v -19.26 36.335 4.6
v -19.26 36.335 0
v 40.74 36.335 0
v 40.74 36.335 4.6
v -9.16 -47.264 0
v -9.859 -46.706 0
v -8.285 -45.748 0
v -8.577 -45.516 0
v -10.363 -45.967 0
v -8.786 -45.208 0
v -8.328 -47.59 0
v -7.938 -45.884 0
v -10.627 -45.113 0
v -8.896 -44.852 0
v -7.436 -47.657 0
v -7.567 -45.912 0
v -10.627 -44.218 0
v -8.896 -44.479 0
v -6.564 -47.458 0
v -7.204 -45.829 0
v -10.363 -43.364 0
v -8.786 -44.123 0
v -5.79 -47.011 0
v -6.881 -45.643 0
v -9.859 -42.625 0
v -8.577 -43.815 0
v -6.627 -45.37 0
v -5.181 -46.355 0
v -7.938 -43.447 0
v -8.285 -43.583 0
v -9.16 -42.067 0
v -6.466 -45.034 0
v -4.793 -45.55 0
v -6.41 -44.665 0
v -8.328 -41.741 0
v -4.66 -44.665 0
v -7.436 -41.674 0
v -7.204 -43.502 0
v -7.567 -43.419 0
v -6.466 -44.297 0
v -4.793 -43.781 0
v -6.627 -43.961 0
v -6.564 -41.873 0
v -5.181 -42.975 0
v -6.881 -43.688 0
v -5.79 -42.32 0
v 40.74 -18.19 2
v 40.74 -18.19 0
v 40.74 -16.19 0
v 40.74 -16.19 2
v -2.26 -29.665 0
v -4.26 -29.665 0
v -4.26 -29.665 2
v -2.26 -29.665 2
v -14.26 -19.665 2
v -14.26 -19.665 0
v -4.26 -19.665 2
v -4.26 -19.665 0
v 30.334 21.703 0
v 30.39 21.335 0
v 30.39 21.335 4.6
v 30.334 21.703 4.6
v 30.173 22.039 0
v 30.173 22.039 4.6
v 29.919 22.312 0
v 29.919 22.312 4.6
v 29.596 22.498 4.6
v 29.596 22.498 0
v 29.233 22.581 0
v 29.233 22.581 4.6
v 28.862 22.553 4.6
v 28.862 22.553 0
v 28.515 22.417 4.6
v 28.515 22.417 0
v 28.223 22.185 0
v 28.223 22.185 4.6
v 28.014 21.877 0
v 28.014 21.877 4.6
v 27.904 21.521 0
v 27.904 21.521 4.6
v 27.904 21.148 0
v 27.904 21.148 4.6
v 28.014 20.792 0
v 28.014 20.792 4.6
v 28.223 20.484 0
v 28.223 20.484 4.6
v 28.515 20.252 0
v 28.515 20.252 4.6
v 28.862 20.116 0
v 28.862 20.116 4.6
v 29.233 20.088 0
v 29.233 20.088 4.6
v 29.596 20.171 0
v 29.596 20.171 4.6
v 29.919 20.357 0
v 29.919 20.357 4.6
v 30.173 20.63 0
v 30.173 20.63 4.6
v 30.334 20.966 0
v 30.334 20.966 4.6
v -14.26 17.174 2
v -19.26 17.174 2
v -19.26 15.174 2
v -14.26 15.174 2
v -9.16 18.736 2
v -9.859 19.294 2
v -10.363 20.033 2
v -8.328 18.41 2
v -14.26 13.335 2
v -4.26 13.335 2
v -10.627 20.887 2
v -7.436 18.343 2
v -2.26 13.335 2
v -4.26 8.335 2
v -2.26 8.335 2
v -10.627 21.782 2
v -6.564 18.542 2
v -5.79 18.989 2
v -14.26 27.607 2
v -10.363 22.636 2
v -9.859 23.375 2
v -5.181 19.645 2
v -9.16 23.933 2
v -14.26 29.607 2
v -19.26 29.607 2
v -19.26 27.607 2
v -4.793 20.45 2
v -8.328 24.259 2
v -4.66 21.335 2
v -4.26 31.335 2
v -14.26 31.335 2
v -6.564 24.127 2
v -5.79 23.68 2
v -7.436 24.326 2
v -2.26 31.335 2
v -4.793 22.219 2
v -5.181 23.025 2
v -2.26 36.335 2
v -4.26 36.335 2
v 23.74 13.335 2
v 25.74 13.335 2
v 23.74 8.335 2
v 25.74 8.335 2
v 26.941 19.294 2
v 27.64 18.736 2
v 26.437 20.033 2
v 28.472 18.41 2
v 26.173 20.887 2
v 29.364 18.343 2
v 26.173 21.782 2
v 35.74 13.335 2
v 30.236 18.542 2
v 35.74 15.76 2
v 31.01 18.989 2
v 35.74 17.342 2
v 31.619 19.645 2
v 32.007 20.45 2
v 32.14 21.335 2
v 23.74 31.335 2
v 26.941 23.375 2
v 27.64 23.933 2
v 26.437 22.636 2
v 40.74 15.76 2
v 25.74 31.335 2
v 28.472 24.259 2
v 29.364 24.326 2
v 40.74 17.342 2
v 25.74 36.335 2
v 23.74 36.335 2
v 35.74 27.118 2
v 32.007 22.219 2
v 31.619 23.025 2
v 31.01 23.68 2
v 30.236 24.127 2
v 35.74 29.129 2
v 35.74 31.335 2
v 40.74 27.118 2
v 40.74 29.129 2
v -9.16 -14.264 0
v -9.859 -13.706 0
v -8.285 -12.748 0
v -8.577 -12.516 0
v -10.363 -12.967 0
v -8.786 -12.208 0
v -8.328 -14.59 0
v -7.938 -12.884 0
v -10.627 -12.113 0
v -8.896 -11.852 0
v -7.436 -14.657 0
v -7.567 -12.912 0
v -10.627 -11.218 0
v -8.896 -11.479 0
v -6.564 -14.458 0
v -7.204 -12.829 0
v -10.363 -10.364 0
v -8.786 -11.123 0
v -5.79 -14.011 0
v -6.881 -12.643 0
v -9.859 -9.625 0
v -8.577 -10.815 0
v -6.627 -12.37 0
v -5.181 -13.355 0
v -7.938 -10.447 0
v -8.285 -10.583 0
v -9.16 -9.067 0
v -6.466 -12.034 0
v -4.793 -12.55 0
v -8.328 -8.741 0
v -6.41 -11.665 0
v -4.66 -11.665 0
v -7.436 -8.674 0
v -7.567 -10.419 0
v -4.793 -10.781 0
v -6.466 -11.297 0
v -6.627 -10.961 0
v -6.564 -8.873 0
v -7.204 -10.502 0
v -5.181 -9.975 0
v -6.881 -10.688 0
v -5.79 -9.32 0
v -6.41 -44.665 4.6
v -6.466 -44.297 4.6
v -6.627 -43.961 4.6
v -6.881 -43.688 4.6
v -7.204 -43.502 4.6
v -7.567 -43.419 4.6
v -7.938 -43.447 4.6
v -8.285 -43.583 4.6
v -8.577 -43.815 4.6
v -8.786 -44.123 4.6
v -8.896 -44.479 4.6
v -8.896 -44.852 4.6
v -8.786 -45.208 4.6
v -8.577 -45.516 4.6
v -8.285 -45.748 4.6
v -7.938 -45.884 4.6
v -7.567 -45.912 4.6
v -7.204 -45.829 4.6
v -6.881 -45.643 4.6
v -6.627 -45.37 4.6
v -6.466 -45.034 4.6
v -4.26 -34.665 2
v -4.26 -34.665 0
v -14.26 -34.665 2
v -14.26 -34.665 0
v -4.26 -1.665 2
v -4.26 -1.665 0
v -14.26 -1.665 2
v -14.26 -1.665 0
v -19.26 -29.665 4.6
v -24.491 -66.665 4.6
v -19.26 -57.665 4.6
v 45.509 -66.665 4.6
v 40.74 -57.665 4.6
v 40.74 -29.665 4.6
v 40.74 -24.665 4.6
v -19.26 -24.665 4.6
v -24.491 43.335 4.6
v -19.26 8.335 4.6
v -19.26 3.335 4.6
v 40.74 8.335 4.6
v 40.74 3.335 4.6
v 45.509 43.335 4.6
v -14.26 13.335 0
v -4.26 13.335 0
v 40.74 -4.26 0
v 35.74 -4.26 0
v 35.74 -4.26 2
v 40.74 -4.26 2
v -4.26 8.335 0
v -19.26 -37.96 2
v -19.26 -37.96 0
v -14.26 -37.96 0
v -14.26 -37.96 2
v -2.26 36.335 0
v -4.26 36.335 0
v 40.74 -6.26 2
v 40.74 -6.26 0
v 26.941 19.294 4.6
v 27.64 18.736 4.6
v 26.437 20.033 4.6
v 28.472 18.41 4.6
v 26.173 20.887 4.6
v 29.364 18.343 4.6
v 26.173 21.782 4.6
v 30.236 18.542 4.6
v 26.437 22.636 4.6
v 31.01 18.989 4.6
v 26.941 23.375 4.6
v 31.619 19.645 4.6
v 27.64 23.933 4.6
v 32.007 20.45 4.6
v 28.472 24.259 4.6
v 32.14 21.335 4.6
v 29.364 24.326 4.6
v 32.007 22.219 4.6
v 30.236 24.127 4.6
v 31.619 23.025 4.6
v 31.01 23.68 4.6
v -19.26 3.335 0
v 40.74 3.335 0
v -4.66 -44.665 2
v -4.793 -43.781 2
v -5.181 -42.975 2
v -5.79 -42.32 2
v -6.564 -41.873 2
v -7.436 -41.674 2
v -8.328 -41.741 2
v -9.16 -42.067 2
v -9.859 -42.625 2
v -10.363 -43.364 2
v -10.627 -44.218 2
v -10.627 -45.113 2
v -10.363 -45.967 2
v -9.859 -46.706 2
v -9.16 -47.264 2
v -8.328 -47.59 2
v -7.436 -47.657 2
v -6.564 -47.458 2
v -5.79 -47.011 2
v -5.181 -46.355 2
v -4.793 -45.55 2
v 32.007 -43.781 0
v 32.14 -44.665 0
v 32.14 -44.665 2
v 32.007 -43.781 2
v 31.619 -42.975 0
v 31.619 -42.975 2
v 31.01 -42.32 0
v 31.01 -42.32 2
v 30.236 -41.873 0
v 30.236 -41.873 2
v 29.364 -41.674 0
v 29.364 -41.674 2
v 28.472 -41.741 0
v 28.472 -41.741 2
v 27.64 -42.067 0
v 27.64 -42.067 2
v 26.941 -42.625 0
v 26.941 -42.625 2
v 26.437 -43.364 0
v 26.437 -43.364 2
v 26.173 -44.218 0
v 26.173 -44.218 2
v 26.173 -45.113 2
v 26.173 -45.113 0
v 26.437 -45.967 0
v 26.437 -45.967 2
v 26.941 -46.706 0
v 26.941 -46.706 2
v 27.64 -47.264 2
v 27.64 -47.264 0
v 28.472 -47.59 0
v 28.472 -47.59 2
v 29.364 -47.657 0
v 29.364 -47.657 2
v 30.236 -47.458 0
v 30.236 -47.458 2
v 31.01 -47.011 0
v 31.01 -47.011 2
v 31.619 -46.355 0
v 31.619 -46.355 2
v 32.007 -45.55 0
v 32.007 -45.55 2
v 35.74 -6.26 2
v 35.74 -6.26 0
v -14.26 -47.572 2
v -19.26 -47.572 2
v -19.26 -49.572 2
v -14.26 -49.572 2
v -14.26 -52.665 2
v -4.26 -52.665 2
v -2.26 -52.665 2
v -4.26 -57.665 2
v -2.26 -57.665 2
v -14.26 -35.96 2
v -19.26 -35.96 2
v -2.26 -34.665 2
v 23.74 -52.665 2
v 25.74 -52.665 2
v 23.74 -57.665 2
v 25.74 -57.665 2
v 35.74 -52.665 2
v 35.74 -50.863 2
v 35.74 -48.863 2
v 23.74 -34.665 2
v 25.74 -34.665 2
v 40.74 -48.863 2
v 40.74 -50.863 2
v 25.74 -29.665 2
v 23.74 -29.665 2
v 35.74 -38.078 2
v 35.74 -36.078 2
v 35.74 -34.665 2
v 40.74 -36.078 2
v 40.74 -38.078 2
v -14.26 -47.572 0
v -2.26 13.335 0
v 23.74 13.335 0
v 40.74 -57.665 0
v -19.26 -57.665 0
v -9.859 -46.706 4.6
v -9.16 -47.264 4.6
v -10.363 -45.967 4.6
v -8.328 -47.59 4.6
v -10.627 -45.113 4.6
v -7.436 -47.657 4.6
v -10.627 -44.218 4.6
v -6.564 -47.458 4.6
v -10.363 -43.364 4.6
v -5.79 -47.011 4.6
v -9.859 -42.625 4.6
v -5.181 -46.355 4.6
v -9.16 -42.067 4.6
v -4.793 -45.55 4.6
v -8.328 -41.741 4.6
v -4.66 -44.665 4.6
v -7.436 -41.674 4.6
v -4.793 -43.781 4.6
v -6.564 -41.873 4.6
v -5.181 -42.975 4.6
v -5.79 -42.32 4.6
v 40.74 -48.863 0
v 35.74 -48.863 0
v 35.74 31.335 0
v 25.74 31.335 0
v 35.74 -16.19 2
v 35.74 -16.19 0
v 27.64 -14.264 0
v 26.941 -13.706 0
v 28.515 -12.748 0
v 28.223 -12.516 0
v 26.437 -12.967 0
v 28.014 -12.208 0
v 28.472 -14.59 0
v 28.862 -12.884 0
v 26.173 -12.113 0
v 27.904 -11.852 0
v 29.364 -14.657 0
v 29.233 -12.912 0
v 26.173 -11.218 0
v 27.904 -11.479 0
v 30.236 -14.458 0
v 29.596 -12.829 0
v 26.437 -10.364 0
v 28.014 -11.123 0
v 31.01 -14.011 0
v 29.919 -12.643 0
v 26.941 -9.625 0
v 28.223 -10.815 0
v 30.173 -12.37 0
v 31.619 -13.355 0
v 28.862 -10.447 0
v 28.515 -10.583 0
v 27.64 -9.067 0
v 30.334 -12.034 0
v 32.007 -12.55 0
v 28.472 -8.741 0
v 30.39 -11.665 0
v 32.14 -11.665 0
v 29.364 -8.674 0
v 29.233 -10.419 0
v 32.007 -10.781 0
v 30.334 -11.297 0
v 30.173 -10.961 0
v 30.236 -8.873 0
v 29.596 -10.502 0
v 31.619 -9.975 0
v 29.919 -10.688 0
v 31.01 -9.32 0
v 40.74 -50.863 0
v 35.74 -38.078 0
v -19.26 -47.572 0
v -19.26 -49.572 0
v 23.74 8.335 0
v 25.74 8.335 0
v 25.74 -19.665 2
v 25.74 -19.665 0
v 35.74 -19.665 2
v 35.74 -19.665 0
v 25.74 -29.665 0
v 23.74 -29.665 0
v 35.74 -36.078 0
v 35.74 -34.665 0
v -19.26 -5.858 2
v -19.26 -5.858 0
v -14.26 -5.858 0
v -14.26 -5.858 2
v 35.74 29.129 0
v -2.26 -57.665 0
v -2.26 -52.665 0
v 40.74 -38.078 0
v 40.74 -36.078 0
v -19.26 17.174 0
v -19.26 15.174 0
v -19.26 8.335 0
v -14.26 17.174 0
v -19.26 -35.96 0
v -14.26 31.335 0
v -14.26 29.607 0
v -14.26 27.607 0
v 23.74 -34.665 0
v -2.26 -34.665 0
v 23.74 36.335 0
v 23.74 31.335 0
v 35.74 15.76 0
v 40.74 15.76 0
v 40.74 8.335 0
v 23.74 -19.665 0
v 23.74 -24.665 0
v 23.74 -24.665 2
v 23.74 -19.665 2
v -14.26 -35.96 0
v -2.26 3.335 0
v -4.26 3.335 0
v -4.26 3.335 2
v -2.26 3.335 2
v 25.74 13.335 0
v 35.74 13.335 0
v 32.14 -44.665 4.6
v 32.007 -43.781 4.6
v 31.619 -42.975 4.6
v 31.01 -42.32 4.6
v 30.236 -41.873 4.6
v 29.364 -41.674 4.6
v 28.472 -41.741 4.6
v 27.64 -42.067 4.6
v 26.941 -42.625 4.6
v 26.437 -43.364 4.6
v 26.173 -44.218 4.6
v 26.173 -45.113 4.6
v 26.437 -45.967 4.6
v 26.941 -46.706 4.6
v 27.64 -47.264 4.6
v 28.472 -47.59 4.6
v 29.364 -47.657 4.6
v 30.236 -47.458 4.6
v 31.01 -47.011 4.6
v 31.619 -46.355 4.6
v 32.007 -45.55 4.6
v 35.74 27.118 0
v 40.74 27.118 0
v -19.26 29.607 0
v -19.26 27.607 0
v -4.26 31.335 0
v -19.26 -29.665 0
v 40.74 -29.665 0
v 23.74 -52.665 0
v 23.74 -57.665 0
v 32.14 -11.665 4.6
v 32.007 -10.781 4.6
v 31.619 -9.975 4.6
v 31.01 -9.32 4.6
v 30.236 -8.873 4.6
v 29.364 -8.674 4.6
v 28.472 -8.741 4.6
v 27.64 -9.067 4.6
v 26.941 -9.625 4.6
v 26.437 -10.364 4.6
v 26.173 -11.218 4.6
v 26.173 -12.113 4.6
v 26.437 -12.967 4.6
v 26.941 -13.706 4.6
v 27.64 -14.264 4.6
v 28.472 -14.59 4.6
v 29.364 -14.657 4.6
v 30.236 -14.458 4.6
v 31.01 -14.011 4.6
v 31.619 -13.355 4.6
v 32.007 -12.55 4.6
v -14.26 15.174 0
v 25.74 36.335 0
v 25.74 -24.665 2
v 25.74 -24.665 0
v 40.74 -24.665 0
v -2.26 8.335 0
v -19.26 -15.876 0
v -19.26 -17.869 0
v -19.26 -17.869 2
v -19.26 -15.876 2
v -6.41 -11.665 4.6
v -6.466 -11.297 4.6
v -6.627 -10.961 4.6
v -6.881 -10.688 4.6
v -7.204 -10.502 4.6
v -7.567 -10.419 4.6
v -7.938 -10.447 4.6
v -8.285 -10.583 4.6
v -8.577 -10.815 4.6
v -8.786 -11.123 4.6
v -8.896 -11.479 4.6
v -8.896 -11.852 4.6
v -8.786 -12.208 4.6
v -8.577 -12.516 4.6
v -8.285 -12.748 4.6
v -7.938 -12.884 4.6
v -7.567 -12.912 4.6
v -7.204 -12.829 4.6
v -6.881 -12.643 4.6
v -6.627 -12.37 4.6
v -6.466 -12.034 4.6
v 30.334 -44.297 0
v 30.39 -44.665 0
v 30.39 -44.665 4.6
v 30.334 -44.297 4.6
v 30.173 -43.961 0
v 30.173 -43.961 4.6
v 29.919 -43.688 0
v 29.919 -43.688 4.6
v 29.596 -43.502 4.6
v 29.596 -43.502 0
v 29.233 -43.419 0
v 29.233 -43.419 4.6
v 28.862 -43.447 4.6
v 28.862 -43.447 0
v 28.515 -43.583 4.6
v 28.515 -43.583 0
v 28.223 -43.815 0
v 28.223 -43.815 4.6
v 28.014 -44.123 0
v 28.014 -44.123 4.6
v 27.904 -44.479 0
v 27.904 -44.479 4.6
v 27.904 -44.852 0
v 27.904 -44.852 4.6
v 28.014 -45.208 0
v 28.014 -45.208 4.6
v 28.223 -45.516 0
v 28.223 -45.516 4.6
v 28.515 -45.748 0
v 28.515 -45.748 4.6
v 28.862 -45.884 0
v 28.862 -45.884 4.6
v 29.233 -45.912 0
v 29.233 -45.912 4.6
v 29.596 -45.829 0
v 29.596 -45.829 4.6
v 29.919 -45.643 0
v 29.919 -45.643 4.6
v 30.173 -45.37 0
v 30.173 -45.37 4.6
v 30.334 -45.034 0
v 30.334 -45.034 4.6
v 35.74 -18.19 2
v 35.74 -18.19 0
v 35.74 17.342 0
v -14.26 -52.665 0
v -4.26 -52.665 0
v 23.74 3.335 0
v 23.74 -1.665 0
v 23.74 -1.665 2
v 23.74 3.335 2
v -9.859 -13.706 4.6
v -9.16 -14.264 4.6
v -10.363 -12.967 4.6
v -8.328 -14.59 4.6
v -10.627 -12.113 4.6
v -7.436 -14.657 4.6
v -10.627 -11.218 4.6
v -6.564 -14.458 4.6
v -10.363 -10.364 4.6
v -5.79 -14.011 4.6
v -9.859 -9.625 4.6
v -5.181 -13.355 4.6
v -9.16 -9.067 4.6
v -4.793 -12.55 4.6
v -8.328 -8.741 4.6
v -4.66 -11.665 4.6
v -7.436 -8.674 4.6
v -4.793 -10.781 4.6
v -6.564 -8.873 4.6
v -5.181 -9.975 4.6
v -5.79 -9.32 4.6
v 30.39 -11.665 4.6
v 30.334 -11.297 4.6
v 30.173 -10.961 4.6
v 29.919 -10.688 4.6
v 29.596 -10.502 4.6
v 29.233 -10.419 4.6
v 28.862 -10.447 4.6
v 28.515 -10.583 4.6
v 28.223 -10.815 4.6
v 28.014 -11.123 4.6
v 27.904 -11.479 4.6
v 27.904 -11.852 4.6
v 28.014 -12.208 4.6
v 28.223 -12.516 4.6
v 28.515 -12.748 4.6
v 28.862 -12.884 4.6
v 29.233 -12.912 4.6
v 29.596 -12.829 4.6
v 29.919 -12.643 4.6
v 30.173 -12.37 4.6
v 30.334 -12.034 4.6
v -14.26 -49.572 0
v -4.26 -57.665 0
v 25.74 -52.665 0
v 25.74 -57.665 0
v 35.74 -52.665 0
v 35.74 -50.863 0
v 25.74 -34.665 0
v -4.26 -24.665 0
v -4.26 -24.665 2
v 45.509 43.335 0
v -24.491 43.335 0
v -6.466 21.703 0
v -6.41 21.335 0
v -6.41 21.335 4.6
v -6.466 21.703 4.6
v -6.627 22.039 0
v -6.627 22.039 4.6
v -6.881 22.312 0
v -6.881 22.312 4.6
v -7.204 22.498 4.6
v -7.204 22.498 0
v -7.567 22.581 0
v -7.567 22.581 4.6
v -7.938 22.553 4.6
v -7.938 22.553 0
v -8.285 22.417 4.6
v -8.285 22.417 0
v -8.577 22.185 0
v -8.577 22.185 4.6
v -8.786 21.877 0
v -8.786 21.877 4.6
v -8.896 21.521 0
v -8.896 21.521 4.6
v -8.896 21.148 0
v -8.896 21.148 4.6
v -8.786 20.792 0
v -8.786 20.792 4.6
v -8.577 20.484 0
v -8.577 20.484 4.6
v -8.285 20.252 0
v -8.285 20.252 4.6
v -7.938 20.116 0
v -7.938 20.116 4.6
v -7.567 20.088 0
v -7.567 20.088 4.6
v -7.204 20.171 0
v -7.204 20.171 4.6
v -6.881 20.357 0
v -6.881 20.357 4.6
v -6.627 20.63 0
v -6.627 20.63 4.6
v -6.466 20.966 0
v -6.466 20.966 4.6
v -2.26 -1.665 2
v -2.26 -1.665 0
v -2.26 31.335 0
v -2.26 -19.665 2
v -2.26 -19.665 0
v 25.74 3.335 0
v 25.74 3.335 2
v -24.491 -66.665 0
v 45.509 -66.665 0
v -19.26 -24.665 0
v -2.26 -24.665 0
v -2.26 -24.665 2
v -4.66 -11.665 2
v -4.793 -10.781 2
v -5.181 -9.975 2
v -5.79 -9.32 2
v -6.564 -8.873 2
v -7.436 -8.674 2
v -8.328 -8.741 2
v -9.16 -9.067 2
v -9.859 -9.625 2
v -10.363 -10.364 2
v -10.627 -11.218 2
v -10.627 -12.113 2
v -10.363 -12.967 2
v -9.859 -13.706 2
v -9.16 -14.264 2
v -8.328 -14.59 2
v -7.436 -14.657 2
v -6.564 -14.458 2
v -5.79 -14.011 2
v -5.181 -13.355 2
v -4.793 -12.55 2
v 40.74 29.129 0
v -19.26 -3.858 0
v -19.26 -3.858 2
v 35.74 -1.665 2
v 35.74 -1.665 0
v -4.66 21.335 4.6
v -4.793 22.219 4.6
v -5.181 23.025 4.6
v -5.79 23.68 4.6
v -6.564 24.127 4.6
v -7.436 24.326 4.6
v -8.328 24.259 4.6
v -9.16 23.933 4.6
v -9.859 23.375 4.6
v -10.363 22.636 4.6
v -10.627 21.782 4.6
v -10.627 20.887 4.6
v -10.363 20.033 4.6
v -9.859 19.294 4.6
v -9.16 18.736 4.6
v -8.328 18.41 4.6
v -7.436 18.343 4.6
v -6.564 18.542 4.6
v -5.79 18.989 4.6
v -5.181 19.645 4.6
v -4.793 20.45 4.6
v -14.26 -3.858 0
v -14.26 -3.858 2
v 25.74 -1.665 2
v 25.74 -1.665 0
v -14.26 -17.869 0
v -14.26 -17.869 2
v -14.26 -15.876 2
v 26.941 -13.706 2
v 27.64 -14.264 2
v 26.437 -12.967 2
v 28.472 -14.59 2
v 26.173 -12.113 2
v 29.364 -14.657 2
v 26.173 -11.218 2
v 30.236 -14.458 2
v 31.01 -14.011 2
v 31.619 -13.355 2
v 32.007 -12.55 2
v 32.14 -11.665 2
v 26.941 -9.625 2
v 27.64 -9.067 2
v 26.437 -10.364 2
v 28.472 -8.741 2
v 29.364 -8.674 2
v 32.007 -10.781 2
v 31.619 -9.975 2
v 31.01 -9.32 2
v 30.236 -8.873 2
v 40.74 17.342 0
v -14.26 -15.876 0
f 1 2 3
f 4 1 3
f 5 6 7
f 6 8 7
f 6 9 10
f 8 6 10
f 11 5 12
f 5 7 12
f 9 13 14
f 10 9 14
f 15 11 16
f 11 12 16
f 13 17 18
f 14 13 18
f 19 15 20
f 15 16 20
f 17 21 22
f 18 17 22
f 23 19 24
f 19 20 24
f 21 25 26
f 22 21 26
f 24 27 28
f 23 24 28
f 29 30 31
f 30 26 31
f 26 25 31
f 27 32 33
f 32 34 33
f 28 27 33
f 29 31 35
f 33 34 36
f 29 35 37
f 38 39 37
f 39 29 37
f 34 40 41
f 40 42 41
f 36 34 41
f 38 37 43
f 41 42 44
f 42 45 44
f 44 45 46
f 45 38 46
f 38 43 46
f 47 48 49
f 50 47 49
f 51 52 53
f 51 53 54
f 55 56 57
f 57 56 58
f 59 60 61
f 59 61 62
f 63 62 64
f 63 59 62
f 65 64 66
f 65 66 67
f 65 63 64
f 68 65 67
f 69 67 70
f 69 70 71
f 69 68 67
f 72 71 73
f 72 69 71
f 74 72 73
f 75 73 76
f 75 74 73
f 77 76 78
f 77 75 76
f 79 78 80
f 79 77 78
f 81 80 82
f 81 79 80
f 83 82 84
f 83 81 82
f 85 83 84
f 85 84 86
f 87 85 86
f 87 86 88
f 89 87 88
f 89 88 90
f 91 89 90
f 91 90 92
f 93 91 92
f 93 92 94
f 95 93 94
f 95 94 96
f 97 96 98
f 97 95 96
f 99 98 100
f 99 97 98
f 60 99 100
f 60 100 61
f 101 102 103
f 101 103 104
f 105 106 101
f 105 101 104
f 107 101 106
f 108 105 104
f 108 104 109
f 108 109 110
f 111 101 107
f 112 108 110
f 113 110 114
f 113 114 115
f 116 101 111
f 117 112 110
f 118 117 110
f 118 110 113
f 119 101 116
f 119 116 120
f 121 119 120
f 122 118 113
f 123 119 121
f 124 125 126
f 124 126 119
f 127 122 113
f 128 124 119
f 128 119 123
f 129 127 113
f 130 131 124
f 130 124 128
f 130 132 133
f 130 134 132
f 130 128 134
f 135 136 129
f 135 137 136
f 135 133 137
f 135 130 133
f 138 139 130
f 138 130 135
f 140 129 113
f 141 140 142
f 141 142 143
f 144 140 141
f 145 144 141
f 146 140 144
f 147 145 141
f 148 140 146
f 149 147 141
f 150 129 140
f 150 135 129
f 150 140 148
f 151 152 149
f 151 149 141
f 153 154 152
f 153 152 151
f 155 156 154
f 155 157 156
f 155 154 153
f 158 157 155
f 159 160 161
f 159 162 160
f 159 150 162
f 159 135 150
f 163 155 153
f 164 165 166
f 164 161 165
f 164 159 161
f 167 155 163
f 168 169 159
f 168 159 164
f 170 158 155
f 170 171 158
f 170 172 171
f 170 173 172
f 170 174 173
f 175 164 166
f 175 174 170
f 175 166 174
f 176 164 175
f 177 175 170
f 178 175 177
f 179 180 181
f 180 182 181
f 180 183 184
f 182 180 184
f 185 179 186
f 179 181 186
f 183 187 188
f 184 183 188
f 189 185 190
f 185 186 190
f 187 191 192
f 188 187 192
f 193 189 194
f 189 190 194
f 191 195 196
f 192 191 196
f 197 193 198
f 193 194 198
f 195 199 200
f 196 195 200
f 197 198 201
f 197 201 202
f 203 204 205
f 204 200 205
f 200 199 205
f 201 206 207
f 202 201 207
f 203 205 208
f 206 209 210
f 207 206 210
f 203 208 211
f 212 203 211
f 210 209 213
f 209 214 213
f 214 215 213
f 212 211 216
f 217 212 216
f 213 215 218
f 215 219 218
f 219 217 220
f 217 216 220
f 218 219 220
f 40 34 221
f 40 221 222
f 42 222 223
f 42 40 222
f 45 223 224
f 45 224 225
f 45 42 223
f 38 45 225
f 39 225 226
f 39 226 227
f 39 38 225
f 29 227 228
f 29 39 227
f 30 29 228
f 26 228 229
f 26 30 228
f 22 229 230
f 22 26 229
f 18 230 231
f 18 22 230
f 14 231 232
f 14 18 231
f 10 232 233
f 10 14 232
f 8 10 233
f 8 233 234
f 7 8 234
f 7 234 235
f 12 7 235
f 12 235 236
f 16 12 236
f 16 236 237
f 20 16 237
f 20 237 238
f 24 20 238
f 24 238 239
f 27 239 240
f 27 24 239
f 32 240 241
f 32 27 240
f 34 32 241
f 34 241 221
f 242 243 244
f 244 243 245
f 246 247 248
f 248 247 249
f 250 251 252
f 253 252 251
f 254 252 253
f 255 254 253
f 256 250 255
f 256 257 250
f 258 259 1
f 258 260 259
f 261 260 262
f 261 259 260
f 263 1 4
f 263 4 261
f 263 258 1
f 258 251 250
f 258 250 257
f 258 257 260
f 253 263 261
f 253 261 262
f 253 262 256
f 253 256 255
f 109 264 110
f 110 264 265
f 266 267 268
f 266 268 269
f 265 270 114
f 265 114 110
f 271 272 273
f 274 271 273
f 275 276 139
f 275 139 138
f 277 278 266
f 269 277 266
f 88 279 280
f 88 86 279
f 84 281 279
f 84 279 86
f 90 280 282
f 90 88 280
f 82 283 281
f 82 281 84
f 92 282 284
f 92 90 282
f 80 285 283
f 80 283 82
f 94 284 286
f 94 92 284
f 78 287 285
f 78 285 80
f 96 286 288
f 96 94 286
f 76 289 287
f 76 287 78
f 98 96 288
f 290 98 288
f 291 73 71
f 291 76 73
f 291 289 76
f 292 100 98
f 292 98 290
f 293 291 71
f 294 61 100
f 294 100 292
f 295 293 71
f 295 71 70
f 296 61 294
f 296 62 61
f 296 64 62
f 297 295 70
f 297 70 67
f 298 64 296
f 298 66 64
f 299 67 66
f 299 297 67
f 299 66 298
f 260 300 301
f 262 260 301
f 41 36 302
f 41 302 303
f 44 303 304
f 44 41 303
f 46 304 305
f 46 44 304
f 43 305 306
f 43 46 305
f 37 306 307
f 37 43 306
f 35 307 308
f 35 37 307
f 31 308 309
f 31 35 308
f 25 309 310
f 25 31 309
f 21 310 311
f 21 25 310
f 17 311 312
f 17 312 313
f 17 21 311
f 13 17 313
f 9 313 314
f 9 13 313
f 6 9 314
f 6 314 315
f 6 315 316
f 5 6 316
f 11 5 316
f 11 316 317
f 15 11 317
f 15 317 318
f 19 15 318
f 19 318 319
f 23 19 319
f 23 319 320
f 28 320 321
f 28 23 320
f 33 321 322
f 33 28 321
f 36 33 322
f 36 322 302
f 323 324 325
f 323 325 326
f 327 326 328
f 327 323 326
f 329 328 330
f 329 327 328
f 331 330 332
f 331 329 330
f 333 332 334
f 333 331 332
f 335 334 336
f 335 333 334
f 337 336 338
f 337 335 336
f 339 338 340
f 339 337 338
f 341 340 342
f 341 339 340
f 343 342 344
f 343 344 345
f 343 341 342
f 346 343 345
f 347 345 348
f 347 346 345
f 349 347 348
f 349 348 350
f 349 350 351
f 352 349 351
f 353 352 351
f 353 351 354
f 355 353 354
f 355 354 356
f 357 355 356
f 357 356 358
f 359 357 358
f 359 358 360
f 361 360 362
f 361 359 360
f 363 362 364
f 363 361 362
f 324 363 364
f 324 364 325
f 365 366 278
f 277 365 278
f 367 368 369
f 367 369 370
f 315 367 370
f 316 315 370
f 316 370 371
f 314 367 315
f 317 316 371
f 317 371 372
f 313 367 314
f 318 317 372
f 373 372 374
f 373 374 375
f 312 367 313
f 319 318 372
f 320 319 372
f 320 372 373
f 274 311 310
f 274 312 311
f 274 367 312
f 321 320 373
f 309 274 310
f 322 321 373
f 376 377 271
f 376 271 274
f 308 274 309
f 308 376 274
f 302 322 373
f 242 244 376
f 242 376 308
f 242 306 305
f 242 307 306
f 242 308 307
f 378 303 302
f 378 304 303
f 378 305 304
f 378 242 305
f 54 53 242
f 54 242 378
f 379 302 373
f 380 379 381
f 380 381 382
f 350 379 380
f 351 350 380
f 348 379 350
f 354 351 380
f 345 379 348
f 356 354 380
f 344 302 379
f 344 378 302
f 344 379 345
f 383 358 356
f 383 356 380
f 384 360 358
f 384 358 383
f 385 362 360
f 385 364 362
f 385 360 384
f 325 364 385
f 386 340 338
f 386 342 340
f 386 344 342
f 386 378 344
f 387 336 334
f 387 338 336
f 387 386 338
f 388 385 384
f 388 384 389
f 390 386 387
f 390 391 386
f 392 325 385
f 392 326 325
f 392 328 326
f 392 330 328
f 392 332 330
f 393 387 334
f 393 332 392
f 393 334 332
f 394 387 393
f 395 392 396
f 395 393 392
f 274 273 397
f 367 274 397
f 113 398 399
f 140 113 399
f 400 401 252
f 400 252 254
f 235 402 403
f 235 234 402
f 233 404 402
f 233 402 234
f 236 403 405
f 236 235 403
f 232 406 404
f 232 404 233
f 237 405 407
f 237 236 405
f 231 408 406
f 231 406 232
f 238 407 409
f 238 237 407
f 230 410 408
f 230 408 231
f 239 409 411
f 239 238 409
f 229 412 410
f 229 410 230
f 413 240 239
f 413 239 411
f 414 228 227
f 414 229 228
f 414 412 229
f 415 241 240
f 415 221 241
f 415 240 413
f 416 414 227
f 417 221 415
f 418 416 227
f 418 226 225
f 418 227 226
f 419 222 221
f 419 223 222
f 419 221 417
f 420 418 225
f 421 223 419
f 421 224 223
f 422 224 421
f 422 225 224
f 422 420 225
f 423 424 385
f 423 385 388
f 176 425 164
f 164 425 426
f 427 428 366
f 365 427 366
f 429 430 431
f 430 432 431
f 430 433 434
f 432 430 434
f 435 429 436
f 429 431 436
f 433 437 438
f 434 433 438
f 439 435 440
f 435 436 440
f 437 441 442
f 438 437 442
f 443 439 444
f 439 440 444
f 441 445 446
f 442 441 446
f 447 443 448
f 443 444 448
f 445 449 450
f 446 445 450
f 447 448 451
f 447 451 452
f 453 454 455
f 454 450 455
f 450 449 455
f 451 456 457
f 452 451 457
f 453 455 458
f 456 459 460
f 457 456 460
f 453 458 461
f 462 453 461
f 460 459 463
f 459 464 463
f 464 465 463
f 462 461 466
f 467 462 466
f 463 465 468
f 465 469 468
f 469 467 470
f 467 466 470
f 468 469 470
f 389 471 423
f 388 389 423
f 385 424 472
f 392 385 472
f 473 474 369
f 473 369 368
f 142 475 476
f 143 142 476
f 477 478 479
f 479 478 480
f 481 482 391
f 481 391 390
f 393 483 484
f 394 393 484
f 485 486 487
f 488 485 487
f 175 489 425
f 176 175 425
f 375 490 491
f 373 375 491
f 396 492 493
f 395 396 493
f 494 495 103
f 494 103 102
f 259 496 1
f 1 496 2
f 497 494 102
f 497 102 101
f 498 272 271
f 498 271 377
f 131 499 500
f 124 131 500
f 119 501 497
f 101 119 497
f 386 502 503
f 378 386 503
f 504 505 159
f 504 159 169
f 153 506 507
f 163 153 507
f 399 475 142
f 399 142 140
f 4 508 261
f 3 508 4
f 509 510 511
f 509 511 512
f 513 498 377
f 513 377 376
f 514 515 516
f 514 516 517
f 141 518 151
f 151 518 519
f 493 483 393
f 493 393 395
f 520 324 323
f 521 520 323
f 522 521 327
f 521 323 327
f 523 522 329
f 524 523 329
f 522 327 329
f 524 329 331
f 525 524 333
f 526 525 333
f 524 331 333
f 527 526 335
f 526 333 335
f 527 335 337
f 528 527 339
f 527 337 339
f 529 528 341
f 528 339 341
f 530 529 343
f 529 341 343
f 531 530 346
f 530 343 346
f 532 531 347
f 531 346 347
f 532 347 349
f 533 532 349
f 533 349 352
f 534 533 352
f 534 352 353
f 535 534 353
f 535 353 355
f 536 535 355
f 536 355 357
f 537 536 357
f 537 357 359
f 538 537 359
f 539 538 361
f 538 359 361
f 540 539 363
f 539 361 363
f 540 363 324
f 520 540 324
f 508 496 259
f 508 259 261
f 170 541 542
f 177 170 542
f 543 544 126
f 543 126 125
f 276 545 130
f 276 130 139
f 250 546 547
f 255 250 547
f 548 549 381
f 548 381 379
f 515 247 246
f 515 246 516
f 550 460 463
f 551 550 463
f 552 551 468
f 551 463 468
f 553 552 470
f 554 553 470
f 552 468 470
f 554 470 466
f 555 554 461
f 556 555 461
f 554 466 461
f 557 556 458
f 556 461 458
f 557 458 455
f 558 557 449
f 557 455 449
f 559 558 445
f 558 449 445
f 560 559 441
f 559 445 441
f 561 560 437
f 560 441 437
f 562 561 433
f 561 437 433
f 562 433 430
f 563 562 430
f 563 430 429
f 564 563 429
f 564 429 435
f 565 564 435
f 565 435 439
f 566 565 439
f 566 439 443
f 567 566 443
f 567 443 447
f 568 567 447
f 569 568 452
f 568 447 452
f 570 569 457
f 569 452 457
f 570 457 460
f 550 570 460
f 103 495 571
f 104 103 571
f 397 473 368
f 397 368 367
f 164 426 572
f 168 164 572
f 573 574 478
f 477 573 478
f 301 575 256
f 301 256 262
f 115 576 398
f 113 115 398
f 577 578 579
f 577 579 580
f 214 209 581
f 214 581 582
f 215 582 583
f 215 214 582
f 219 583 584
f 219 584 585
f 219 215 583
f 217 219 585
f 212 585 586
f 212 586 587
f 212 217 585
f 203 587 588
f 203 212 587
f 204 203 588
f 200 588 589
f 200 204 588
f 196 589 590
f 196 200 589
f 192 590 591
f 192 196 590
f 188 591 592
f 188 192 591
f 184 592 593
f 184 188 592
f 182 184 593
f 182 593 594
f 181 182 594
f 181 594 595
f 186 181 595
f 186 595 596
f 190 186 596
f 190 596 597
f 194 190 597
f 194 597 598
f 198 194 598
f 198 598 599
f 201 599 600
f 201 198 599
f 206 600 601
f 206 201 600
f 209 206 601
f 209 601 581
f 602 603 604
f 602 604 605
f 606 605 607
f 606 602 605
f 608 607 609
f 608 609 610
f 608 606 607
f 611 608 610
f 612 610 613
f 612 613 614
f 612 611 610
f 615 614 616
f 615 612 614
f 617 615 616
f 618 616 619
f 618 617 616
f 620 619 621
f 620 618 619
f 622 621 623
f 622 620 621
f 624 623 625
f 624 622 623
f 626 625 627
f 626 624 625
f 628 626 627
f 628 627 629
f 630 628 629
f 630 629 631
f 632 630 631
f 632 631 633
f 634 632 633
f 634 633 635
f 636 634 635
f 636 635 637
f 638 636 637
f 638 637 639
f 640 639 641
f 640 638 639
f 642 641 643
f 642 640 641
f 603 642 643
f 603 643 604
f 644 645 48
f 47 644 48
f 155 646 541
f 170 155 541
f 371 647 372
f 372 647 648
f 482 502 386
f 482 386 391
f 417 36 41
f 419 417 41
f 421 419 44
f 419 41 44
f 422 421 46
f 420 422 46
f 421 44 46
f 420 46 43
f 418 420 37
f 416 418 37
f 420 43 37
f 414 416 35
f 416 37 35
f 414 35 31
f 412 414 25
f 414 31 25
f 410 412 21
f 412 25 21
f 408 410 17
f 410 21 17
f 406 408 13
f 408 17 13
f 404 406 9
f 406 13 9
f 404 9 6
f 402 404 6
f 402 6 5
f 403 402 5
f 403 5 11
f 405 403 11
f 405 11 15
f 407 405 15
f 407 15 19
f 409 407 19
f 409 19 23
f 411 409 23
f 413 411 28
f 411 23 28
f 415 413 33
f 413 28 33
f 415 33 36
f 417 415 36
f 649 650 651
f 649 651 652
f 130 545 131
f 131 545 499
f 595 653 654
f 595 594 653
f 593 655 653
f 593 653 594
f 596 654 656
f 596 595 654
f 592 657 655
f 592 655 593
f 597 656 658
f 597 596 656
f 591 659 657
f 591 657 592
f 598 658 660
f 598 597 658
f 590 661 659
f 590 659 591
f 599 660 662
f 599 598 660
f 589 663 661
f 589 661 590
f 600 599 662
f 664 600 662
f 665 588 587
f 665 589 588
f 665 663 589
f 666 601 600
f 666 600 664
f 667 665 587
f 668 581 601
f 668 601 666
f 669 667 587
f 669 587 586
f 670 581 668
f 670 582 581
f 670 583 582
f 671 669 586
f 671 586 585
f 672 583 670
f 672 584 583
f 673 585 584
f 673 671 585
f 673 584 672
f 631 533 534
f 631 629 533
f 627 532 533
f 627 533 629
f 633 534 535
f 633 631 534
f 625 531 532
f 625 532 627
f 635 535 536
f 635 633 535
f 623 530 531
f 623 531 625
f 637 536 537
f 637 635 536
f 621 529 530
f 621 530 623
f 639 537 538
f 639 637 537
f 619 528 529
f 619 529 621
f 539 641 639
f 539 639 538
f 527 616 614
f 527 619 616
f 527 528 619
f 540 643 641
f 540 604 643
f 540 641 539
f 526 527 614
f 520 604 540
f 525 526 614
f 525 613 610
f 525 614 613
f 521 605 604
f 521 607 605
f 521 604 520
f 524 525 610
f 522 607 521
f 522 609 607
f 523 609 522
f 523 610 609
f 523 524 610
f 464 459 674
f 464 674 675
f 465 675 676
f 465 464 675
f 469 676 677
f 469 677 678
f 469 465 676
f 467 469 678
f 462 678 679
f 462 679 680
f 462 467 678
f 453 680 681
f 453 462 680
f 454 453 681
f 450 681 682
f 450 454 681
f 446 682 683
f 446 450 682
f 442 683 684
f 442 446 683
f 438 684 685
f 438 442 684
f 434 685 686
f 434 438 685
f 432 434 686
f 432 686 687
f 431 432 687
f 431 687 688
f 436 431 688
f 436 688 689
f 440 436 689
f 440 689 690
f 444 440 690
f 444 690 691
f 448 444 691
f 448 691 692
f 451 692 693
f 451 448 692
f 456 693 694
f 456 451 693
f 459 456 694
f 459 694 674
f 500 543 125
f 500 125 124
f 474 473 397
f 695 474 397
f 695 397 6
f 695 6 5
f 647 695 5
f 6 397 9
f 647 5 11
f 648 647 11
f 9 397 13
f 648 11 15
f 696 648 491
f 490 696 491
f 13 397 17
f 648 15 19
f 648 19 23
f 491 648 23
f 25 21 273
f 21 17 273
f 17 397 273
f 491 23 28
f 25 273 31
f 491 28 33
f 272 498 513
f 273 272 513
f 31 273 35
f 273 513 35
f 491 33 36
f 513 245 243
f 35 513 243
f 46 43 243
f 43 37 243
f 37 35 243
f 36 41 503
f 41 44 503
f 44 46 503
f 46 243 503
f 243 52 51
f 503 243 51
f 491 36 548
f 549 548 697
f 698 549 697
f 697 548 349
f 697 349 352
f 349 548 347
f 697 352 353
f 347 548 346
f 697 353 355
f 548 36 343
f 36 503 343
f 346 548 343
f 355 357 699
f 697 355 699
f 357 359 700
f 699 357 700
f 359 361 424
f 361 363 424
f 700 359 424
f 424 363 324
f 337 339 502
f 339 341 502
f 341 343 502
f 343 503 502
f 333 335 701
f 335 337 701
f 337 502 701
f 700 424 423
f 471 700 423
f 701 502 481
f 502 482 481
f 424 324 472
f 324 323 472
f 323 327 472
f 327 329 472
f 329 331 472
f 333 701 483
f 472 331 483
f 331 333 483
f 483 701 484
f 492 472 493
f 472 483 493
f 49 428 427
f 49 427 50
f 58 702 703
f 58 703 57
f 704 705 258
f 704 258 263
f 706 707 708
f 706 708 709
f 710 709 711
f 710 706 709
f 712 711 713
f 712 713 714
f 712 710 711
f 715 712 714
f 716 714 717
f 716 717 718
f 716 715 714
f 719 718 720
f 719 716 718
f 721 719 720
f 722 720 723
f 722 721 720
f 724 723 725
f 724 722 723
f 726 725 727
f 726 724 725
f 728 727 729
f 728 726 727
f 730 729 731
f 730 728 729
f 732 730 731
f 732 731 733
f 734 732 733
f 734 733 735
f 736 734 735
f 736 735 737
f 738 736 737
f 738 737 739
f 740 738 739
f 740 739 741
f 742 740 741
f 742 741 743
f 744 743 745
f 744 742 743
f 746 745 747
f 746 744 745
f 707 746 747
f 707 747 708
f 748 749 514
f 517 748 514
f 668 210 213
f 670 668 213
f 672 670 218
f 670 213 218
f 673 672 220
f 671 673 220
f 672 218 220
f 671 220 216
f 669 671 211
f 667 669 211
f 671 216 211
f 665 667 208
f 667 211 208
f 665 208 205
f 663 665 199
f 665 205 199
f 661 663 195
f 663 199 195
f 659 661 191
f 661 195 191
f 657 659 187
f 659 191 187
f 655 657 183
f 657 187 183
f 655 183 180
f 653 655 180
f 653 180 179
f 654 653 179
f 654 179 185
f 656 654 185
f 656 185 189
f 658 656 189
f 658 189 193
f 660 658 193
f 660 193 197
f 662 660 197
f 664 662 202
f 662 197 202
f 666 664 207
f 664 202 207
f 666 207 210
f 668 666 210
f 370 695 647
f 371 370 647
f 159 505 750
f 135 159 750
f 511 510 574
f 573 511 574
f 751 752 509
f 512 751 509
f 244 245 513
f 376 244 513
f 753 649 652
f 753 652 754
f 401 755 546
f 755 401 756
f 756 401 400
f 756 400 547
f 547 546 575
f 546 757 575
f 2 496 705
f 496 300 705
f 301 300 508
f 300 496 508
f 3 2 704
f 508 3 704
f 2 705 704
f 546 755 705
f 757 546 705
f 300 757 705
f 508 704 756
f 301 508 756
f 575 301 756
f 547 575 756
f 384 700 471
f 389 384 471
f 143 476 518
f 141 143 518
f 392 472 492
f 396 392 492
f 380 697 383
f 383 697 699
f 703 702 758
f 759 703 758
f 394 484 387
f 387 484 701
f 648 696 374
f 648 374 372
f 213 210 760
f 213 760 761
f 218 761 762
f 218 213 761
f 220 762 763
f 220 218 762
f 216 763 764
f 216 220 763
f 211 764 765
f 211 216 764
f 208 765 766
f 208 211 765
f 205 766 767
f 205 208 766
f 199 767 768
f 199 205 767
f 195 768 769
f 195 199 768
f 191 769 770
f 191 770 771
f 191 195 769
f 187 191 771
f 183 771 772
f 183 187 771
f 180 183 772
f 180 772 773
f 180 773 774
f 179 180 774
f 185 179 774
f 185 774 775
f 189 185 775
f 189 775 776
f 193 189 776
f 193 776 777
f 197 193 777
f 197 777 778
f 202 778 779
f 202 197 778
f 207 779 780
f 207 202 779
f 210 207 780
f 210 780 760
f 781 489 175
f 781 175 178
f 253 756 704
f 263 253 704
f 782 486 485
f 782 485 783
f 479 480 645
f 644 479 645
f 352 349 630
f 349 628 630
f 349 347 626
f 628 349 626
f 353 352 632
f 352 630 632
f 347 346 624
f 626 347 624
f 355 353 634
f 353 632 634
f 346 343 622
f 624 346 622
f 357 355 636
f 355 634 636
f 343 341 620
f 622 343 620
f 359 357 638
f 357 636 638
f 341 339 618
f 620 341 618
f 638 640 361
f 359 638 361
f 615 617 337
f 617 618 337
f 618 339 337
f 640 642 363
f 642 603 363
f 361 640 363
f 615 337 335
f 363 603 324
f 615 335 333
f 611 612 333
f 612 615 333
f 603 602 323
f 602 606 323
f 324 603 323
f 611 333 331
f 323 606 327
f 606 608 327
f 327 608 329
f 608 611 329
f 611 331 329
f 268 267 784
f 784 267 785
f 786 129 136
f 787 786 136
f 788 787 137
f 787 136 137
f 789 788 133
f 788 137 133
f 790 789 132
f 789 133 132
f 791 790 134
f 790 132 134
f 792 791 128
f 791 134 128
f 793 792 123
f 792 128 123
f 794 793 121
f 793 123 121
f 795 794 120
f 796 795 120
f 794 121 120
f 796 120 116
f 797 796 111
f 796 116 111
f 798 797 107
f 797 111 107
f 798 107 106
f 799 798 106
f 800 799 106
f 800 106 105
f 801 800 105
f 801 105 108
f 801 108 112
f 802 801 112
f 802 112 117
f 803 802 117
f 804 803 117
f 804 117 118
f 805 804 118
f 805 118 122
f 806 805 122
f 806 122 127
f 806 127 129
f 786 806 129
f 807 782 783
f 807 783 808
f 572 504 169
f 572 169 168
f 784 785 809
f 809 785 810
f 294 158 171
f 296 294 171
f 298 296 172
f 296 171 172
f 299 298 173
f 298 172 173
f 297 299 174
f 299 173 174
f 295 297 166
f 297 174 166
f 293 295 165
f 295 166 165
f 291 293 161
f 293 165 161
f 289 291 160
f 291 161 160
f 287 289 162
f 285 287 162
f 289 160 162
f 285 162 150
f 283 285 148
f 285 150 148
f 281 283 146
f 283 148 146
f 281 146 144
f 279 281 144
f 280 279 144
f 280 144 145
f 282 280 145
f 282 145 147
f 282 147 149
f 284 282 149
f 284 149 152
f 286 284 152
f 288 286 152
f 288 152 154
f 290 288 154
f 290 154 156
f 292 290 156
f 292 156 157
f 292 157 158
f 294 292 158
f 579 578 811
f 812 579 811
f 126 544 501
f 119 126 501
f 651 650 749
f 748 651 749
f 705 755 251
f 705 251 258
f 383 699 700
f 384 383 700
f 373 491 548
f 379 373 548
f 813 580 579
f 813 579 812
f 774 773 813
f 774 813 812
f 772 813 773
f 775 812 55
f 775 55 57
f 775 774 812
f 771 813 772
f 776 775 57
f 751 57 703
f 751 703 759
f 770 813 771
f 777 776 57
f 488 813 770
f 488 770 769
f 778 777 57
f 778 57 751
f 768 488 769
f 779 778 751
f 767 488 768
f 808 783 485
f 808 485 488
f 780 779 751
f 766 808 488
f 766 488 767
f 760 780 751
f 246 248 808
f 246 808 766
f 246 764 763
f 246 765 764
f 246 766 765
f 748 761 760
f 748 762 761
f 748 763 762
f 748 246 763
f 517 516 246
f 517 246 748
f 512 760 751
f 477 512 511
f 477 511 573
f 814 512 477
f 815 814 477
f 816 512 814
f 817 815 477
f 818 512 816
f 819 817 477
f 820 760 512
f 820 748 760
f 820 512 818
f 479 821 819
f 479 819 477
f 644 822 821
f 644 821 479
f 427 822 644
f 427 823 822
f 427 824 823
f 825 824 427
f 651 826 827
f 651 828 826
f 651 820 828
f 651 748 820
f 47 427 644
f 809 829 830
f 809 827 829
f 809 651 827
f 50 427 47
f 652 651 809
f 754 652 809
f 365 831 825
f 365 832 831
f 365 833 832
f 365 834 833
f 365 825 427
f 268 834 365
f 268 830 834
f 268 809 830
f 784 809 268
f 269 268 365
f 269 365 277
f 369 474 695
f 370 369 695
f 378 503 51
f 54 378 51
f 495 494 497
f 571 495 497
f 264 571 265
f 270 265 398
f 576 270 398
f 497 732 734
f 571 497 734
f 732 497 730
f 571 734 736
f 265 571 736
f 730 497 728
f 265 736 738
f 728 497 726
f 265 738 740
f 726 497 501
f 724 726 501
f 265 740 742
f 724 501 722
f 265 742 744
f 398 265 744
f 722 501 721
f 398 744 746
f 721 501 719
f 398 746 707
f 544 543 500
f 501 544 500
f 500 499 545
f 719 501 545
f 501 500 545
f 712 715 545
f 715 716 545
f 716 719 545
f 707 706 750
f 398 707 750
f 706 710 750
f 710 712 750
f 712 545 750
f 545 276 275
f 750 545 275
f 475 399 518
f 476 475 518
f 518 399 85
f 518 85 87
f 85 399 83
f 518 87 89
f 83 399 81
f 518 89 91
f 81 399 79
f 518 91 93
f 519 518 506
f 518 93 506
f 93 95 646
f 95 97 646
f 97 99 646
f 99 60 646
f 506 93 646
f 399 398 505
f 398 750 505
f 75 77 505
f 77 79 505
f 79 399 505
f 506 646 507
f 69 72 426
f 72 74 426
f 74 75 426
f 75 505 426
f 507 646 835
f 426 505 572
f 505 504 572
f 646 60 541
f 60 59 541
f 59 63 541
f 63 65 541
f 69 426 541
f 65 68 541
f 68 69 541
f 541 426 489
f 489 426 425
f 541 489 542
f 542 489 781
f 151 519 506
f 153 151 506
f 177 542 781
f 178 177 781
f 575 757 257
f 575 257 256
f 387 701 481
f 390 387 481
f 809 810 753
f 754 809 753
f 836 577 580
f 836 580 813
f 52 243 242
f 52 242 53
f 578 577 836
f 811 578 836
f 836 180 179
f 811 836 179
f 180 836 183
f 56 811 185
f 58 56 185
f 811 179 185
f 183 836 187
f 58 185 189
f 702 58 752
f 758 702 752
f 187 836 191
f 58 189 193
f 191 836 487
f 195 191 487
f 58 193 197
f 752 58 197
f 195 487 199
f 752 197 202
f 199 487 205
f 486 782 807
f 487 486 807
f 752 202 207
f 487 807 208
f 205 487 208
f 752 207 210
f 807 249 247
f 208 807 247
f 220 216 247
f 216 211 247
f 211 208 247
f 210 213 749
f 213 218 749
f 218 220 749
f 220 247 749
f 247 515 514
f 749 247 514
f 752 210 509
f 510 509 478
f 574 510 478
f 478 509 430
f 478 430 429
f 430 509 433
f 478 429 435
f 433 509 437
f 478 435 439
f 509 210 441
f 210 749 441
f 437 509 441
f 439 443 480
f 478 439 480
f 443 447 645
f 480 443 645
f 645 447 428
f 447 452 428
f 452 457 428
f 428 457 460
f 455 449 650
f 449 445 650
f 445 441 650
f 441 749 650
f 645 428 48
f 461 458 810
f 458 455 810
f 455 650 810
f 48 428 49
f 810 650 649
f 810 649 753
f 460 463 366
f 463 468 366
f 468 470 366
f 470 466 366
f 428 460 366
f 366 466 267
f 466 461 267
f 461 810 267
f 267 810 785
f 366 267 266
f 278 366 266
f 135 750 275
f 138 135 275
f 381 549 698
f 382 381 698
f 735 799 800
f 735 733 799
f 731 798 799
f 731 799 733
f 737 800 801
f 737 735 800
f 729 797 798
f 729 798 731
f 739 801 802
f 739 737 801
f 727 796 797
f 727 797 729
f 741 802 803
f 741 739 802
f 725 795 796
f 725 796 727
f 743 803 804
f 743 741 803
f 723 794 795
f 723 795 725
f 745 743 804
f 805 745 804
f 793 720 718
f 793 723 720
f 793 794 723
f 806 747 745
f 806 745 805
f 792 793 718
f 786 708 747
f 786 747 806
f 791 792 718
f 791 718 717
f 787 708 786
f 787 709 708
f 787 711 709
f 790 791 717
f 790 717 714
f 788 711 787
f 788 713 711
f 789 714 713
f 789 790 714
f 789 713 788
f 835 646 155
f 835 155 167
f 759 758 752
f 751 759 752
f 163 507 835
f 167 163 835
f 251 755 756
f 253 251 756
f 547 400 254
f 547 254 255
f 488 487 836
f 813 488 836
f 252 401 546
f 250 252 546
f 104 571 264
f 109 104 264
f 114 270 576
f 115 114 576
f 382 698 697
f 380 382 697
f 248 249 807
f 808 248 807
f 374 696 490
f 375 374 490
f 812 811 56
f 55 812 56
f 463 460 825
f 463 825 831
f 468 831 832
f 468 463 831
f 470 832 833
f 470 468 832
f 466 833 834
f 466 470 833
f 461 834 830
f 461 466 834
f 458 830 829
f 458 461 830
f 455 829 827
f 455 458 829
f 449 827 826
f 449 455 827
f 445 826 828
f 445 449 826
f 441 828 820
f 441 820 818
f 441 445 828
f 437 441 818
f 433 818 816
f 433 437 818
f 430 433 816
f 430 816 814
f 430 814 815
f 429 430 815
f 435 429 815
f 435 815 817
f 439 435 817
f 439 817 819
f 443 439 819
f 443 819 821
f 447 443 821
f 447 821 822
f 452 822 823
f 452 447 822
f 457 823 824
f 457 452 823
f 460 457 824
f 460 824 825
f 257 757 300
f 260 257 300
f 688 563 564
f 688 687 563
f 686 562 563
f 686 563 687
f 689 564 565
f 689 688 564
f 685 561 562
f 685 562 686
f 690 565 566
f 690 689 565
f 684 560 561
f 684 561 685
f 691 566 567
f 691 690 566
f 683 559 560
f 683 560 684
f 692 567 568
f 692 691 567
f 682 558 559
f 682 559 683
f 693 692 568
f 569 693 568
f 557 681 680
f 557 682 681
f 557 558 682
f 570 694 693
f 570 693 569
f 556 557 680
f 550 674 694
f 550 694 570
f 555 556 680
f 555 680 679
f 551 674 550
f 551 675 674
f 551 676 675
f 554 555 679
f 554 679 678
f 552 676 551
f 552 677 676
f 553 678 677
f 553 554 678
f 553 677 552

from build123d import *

# Parameters (mm, degrees)
F0_R     = 3
F0_W     = 2
F0_H     = 5
F0_W_2   = 5
F0_H_2   = 2
F0_H_3   = 2.0107477903
F0_H_4   = 1.5826318413
F1_DEPTH = 2
F0_H_5   = 1.9926615059
F2_W     = 70
F2_H     = 110
F2_W_2   = 60
F2_H_2   = 28
F3_DEPTH = 4.6
F0_R_2   = 1.25
F4_DEPTH = 4.6


with BuildPart() as f1:
    # F0 (on Top) → F1 (new body)
    with BuildSketch(Plane.XY):
        Polygon((-4.260212779, 31.3345443402), (-14.260212779, 31.3345443402), (-14.260212779, 29.606844902), (-14.260212779, 27.606844902), (-14.260212779, 22.3345443402), (-14.260212779, 20.3345443402), (-14.260212779, 17.1737267151), (-14.260212779, 15.1737267151), (-14.260212779, 13.3345443402), (-4.260212779, 13.3345443402), (-2.260212779, 13.3345443402), (8.7358048186, 13.3345443402), (10.7358048186, 13.3345443402), (23.739787221, 13.3345443402), (25.739787221, 13.3345443402), (35.739787221, 13.3345443402), (35.739787221, 15.7596264035), (35.739787221, 17.3422582448), (35.739787221, 20.3345443402), (35.739787221, 22.3345443402), (35.739787221, 27.1184686571), (35.739787221, 29.1292164475), (35.739787221, 31.3345443402), (25.739787221, 31.3345443402), (23.739787221, 31.3345443402), (10.739787221, 31.3345443402), (8.739787221, 31.3345443402), (-2.260212779, 31.3345443402), align=None)
        with Locations((-7.660212779, 21.3345443402)):
            Circle(F0_R, mode=Mode.SUBTRACT)
        with Locations((29.139787221, 21.3345443402)):
            Circle(F0_R, mode=Mode.SUBTRACT)
        with Locations((-3.260212779, 33.8345443402)):
            Rectangle(F0_W, F0_H)
        with Locations((-16.760212779, 28.606844902)):
            Rectangle(F0_W_2, F0_H_2)
        with Locations((24.739787221, 33.8345443402)):
            Rectangle(F0_W, F0_H)
        with Locations((-16.760212779, 16.1737267151)):
            Rectangle(F0_W_2, F0_H_2)
        with Locations((38.239787221, 28.1238425523)):
            Rectangle(F0_W_2, F0_H_3)
        with Locations((-3.260212779, 10.8345443402)):
            Rectangle(F0_W, F0_H)
        with Locations((38.239787221, 16.5509423241)):
            Rectangle(F0_W_2, F0_H_4)
        with Locations((24.739787221, 10.8345443402)):
            Rectangle(F0_W, F0_H)
    extrude(amount=F1_DEPTH)

    # F0 (on Top) → F4 (join)
    with BuildSketch(Plane.XY):
        with Locations((-7.660212779, 21.3345443402)):
            Circle(F0_R)
        with Locations((-7.660212779, 21.3345443402)):
            Circle(F0_R_2, mode=Mode.SUBTRACT)
        with Locations((29.139787221, 21.3345443402)):
            Circle(F0_R)
        with Locations((29.139787221, 21.3345443402)):
            Circle(F0_R_2, mode=Mode.SUBTRACT)
    extrude(amount=F4_DEPTH)


with BuildPart() as f1b:
    # F0 (on Top) → F1, piece 2 (new body)
    with BuildSketch(Plane.XY):
        Polygon((-4.260212779, -1.6654556598), (-14.260212779, -1.6654556598), (-14.260212779, -3.8577791788), (-14.260212779, -5.8577791788), (-14.260212779, -10.6654556598), (-14.260212779, -12.6654556598), (-14.260212779, -15.8761590719), (-14.260212779, -17.8688205779), (-14.260212779, -19.6654556598), (-4.260212779, -19.6654556598), (-2.260212779, -19.6654556598), (8.7807420641, -19.6654556598), (10.7807420641, -19.6654556598), (23.739787221, -19.6654556598), (25.739787221, -19.6654556598), (35.739787221, -19.6654556598), (35.739787221, -18.1903596967), (35.739787221, -16.1903596967), (35.739787221, -12.6654556598), (35.739787221, -10.6654556598), (35.739787221, -6.2599289231), (35.739787221, -4.2599289231), (35.739787221, -1.6654556598), (25.739787221, -1.6654556598), (23.739787221, -1.6654556598), (10.739787221, -1.6654556598), (8.739787221, -1.6654556598), (-2.260212779, -1.6654556598), align=None)
        with Locations((-7.660212779, -11.6654556598)):
            Circle(F0_R, mode=Mode.SUBTRACT)
        with Locations((29.139787221, -11.6654556598)):
            Circle(F0_R, mode=Mode.SUBTRACT)
        with Locations((-3.260212779, 0.8345443402)):
            Rectangle(F0_W, F0_H)
        with Locations((-16.760212779, -4.8577791788)):
            Rectangle(F0_W_2, F0_H_2)
        with Locations((24.739787221, 0.8345443402)):
            Rectangle(F0_W, F0_H)
        with Locations((-16.760212779, -16.8724898249)):
            Rectangle(F0_W_2, F0_H_5)
        with Locations((38.239787221, -5.2599289231)):
            Rectangle(F0_W_2, F0_H_2)
        with Locations((-3.260212779, -22.1654556598)):
            Rectangle(F0_W, F0_H)
        with Locations((38.239787221, -17.1903596967)):
            Rectangle(F0_W_2, F0_H_2)
        with Locations((24.739787221, -22.1654556598)):
            Rectangle(F0_W, F0_H)
    extrude(amount=F1_DEPTH)


with BuildPart() as f1c:
    # F0 (on Top) → F1, piece 3 (new body)
    with BuildSketch(Plane.XY):
        Polygon((-4.260212779, -34.6654556598), (-14.260212779, -34.6654556598), (-14.260212779, -35.9602573812), (-14.260212779, -37.9602573812), (-14.260212779, -41.6654556598), (-14.260212779, -43.6654556598), (-14.260212779, -47.5723225176), (-14.260212779, -49.5723225176), (-14.260212779, -52.6654556598), (-4.260212779, -52.6654556598), (-2.260212779, -52.6654556598), (8.3012469113, -52.6654556598), (10.3012469113, -52.6654556598), (23.739787221, -52.6654556598), (25.739787221, -52.6654556598), (35.739787221, -52.6654556598), (35.739787221, -50.8625470102), (35.739787221, -48.8625470102), (35.739787221, -45.6654556598), (35.739787221, -43.6654556598), (35.739787221, -38.0775518715), (35.739787221, -36.0775518715), (35.739787221, -34.6654556598), (25.739787221, -34.6654556598), (23.739787221, -34.6654556598), (10.7358048186, -34.6654556598), (8.7358048186, -34.6654556598), (-2.260212779, -34.6654556598), align=None)
        with Locations((-7.660212779, -44.6654556598)):
            Circle(F0_R, mode=Mode.SUBTRACT)
        with Locations((29.139787221, -44.6654556598)):
            Circle(F0_R, mode=Mode.SUBTRACT)
        with Locations((-3.260212779, -32.1654556598)):
            Rectangle(F0_W, F0_H)
        with Locations((-16.760212779, -36.9602573812)):
            Rectangle(F0_W_2, F0_H_2)
        with Locations((24.739787221, -32.1654556598)):
            Rectangle(F0_W, F0_H)
        with Locations((-16.760212779, -48.5723225176)):
            Rectangle(F0_W_2, F0_H_2)
        with Locations((38.239787221, -37.0775518715)):
            Rectangle(F0_W_2, F0_H_2)
        with Locations((-3.260212779, -55.1654556598)):
            Rectangle(F0_W, F0_H)
        with Locations((38.239787221, -49.8625470102)):
            Rectangle(F0_W_2, F0_H_2)
        with Locations((24.739787221, -55.1654556598)):
            Rectangle(F0_W, F0_H)
    extrude(amount=F1_DEPTH)


with BuildPart() as f3:
    # F2 (on Top) → F3 (new body)
    with BuildSketch(Plane.XY):
        with Locations((10.5093383789, -11.6654556598)):
            Rectangle(F2_W, F2_H)
        with Locations((10.739787221, -43.6654556598)):
            Rectangle(F2_W_2, F2_H_2, mode=Mode.SUBTRACT)
        with Locations((10.739787221, -10.6654556598)):
            Rectangle(F2_W_2, F2_H_2, mode=Mode.SUBTRACT)
        with Locations((10.739787221, 22.3345443402)):
            Rectangle(F2_W_2, F2_H_2, mode=Mode.SUBTRACT)
    extrude(amount=F3_DEPTH)


with BuildPart() as f4:
    # F0 (on Top) → F4, piece 2 (new body)
    with BuildSketch(Plane.XY):
        with Locations((-7.660212779, -11.6654556598)):
            Circle(F0_R)
        with Locations((-7.660212779, -11.6654556598)):
            Circle(F0_R_2, mode=Mode.SUBTRACT)
    extrude(amount=F4_DEPTH)


with BuildPart() as f4b:
    # F0 (on Top) → F4, piece 3 (new body)
    with BuildSketch(Plane.XY):
        with Locations((29.139787221, -11.6654556598)):
            Circle(F0_R)
        with Locations((29.139787221, -11.6654556598)):
            Circle(F0_R_2, mode=Mode.SUBTRACT)
    extrude(amount=F4_DEPTH)


with BuildPart() as f4c:
    # F0 (on Top) → F4, piece 4 (new body)
    with BuildSketch(Plane.XY):
        with Locations((-7.660212779, -44.6654556598)):
            Circle(F0_R)
        with Locations((-7.660212779, -44.6654556598)):
            Circle(F0_R_2, mode=Mode.SUBTRACT)
    extrude(amount=F4_DEPTH)


with BuildPart() as f4d:
    # F0 (on Top) → F4, piece 5 (new body)
    with BuildSketch(Plane.XY):
        with Locations((29.139787221, -44.6654556598)):
            Circle(F0_R)
        with Locations((29.139787221, -44.6654556598)):
            Circle(F0_R_2, mode=Mode.SUBTRACT)
    extrude(amount=F4_DEPTH)


solid = Compound([f1.part, f1b.part, f1c.part, f3.part, f4.part, f4b.part, f4c.part, f4d.part])
